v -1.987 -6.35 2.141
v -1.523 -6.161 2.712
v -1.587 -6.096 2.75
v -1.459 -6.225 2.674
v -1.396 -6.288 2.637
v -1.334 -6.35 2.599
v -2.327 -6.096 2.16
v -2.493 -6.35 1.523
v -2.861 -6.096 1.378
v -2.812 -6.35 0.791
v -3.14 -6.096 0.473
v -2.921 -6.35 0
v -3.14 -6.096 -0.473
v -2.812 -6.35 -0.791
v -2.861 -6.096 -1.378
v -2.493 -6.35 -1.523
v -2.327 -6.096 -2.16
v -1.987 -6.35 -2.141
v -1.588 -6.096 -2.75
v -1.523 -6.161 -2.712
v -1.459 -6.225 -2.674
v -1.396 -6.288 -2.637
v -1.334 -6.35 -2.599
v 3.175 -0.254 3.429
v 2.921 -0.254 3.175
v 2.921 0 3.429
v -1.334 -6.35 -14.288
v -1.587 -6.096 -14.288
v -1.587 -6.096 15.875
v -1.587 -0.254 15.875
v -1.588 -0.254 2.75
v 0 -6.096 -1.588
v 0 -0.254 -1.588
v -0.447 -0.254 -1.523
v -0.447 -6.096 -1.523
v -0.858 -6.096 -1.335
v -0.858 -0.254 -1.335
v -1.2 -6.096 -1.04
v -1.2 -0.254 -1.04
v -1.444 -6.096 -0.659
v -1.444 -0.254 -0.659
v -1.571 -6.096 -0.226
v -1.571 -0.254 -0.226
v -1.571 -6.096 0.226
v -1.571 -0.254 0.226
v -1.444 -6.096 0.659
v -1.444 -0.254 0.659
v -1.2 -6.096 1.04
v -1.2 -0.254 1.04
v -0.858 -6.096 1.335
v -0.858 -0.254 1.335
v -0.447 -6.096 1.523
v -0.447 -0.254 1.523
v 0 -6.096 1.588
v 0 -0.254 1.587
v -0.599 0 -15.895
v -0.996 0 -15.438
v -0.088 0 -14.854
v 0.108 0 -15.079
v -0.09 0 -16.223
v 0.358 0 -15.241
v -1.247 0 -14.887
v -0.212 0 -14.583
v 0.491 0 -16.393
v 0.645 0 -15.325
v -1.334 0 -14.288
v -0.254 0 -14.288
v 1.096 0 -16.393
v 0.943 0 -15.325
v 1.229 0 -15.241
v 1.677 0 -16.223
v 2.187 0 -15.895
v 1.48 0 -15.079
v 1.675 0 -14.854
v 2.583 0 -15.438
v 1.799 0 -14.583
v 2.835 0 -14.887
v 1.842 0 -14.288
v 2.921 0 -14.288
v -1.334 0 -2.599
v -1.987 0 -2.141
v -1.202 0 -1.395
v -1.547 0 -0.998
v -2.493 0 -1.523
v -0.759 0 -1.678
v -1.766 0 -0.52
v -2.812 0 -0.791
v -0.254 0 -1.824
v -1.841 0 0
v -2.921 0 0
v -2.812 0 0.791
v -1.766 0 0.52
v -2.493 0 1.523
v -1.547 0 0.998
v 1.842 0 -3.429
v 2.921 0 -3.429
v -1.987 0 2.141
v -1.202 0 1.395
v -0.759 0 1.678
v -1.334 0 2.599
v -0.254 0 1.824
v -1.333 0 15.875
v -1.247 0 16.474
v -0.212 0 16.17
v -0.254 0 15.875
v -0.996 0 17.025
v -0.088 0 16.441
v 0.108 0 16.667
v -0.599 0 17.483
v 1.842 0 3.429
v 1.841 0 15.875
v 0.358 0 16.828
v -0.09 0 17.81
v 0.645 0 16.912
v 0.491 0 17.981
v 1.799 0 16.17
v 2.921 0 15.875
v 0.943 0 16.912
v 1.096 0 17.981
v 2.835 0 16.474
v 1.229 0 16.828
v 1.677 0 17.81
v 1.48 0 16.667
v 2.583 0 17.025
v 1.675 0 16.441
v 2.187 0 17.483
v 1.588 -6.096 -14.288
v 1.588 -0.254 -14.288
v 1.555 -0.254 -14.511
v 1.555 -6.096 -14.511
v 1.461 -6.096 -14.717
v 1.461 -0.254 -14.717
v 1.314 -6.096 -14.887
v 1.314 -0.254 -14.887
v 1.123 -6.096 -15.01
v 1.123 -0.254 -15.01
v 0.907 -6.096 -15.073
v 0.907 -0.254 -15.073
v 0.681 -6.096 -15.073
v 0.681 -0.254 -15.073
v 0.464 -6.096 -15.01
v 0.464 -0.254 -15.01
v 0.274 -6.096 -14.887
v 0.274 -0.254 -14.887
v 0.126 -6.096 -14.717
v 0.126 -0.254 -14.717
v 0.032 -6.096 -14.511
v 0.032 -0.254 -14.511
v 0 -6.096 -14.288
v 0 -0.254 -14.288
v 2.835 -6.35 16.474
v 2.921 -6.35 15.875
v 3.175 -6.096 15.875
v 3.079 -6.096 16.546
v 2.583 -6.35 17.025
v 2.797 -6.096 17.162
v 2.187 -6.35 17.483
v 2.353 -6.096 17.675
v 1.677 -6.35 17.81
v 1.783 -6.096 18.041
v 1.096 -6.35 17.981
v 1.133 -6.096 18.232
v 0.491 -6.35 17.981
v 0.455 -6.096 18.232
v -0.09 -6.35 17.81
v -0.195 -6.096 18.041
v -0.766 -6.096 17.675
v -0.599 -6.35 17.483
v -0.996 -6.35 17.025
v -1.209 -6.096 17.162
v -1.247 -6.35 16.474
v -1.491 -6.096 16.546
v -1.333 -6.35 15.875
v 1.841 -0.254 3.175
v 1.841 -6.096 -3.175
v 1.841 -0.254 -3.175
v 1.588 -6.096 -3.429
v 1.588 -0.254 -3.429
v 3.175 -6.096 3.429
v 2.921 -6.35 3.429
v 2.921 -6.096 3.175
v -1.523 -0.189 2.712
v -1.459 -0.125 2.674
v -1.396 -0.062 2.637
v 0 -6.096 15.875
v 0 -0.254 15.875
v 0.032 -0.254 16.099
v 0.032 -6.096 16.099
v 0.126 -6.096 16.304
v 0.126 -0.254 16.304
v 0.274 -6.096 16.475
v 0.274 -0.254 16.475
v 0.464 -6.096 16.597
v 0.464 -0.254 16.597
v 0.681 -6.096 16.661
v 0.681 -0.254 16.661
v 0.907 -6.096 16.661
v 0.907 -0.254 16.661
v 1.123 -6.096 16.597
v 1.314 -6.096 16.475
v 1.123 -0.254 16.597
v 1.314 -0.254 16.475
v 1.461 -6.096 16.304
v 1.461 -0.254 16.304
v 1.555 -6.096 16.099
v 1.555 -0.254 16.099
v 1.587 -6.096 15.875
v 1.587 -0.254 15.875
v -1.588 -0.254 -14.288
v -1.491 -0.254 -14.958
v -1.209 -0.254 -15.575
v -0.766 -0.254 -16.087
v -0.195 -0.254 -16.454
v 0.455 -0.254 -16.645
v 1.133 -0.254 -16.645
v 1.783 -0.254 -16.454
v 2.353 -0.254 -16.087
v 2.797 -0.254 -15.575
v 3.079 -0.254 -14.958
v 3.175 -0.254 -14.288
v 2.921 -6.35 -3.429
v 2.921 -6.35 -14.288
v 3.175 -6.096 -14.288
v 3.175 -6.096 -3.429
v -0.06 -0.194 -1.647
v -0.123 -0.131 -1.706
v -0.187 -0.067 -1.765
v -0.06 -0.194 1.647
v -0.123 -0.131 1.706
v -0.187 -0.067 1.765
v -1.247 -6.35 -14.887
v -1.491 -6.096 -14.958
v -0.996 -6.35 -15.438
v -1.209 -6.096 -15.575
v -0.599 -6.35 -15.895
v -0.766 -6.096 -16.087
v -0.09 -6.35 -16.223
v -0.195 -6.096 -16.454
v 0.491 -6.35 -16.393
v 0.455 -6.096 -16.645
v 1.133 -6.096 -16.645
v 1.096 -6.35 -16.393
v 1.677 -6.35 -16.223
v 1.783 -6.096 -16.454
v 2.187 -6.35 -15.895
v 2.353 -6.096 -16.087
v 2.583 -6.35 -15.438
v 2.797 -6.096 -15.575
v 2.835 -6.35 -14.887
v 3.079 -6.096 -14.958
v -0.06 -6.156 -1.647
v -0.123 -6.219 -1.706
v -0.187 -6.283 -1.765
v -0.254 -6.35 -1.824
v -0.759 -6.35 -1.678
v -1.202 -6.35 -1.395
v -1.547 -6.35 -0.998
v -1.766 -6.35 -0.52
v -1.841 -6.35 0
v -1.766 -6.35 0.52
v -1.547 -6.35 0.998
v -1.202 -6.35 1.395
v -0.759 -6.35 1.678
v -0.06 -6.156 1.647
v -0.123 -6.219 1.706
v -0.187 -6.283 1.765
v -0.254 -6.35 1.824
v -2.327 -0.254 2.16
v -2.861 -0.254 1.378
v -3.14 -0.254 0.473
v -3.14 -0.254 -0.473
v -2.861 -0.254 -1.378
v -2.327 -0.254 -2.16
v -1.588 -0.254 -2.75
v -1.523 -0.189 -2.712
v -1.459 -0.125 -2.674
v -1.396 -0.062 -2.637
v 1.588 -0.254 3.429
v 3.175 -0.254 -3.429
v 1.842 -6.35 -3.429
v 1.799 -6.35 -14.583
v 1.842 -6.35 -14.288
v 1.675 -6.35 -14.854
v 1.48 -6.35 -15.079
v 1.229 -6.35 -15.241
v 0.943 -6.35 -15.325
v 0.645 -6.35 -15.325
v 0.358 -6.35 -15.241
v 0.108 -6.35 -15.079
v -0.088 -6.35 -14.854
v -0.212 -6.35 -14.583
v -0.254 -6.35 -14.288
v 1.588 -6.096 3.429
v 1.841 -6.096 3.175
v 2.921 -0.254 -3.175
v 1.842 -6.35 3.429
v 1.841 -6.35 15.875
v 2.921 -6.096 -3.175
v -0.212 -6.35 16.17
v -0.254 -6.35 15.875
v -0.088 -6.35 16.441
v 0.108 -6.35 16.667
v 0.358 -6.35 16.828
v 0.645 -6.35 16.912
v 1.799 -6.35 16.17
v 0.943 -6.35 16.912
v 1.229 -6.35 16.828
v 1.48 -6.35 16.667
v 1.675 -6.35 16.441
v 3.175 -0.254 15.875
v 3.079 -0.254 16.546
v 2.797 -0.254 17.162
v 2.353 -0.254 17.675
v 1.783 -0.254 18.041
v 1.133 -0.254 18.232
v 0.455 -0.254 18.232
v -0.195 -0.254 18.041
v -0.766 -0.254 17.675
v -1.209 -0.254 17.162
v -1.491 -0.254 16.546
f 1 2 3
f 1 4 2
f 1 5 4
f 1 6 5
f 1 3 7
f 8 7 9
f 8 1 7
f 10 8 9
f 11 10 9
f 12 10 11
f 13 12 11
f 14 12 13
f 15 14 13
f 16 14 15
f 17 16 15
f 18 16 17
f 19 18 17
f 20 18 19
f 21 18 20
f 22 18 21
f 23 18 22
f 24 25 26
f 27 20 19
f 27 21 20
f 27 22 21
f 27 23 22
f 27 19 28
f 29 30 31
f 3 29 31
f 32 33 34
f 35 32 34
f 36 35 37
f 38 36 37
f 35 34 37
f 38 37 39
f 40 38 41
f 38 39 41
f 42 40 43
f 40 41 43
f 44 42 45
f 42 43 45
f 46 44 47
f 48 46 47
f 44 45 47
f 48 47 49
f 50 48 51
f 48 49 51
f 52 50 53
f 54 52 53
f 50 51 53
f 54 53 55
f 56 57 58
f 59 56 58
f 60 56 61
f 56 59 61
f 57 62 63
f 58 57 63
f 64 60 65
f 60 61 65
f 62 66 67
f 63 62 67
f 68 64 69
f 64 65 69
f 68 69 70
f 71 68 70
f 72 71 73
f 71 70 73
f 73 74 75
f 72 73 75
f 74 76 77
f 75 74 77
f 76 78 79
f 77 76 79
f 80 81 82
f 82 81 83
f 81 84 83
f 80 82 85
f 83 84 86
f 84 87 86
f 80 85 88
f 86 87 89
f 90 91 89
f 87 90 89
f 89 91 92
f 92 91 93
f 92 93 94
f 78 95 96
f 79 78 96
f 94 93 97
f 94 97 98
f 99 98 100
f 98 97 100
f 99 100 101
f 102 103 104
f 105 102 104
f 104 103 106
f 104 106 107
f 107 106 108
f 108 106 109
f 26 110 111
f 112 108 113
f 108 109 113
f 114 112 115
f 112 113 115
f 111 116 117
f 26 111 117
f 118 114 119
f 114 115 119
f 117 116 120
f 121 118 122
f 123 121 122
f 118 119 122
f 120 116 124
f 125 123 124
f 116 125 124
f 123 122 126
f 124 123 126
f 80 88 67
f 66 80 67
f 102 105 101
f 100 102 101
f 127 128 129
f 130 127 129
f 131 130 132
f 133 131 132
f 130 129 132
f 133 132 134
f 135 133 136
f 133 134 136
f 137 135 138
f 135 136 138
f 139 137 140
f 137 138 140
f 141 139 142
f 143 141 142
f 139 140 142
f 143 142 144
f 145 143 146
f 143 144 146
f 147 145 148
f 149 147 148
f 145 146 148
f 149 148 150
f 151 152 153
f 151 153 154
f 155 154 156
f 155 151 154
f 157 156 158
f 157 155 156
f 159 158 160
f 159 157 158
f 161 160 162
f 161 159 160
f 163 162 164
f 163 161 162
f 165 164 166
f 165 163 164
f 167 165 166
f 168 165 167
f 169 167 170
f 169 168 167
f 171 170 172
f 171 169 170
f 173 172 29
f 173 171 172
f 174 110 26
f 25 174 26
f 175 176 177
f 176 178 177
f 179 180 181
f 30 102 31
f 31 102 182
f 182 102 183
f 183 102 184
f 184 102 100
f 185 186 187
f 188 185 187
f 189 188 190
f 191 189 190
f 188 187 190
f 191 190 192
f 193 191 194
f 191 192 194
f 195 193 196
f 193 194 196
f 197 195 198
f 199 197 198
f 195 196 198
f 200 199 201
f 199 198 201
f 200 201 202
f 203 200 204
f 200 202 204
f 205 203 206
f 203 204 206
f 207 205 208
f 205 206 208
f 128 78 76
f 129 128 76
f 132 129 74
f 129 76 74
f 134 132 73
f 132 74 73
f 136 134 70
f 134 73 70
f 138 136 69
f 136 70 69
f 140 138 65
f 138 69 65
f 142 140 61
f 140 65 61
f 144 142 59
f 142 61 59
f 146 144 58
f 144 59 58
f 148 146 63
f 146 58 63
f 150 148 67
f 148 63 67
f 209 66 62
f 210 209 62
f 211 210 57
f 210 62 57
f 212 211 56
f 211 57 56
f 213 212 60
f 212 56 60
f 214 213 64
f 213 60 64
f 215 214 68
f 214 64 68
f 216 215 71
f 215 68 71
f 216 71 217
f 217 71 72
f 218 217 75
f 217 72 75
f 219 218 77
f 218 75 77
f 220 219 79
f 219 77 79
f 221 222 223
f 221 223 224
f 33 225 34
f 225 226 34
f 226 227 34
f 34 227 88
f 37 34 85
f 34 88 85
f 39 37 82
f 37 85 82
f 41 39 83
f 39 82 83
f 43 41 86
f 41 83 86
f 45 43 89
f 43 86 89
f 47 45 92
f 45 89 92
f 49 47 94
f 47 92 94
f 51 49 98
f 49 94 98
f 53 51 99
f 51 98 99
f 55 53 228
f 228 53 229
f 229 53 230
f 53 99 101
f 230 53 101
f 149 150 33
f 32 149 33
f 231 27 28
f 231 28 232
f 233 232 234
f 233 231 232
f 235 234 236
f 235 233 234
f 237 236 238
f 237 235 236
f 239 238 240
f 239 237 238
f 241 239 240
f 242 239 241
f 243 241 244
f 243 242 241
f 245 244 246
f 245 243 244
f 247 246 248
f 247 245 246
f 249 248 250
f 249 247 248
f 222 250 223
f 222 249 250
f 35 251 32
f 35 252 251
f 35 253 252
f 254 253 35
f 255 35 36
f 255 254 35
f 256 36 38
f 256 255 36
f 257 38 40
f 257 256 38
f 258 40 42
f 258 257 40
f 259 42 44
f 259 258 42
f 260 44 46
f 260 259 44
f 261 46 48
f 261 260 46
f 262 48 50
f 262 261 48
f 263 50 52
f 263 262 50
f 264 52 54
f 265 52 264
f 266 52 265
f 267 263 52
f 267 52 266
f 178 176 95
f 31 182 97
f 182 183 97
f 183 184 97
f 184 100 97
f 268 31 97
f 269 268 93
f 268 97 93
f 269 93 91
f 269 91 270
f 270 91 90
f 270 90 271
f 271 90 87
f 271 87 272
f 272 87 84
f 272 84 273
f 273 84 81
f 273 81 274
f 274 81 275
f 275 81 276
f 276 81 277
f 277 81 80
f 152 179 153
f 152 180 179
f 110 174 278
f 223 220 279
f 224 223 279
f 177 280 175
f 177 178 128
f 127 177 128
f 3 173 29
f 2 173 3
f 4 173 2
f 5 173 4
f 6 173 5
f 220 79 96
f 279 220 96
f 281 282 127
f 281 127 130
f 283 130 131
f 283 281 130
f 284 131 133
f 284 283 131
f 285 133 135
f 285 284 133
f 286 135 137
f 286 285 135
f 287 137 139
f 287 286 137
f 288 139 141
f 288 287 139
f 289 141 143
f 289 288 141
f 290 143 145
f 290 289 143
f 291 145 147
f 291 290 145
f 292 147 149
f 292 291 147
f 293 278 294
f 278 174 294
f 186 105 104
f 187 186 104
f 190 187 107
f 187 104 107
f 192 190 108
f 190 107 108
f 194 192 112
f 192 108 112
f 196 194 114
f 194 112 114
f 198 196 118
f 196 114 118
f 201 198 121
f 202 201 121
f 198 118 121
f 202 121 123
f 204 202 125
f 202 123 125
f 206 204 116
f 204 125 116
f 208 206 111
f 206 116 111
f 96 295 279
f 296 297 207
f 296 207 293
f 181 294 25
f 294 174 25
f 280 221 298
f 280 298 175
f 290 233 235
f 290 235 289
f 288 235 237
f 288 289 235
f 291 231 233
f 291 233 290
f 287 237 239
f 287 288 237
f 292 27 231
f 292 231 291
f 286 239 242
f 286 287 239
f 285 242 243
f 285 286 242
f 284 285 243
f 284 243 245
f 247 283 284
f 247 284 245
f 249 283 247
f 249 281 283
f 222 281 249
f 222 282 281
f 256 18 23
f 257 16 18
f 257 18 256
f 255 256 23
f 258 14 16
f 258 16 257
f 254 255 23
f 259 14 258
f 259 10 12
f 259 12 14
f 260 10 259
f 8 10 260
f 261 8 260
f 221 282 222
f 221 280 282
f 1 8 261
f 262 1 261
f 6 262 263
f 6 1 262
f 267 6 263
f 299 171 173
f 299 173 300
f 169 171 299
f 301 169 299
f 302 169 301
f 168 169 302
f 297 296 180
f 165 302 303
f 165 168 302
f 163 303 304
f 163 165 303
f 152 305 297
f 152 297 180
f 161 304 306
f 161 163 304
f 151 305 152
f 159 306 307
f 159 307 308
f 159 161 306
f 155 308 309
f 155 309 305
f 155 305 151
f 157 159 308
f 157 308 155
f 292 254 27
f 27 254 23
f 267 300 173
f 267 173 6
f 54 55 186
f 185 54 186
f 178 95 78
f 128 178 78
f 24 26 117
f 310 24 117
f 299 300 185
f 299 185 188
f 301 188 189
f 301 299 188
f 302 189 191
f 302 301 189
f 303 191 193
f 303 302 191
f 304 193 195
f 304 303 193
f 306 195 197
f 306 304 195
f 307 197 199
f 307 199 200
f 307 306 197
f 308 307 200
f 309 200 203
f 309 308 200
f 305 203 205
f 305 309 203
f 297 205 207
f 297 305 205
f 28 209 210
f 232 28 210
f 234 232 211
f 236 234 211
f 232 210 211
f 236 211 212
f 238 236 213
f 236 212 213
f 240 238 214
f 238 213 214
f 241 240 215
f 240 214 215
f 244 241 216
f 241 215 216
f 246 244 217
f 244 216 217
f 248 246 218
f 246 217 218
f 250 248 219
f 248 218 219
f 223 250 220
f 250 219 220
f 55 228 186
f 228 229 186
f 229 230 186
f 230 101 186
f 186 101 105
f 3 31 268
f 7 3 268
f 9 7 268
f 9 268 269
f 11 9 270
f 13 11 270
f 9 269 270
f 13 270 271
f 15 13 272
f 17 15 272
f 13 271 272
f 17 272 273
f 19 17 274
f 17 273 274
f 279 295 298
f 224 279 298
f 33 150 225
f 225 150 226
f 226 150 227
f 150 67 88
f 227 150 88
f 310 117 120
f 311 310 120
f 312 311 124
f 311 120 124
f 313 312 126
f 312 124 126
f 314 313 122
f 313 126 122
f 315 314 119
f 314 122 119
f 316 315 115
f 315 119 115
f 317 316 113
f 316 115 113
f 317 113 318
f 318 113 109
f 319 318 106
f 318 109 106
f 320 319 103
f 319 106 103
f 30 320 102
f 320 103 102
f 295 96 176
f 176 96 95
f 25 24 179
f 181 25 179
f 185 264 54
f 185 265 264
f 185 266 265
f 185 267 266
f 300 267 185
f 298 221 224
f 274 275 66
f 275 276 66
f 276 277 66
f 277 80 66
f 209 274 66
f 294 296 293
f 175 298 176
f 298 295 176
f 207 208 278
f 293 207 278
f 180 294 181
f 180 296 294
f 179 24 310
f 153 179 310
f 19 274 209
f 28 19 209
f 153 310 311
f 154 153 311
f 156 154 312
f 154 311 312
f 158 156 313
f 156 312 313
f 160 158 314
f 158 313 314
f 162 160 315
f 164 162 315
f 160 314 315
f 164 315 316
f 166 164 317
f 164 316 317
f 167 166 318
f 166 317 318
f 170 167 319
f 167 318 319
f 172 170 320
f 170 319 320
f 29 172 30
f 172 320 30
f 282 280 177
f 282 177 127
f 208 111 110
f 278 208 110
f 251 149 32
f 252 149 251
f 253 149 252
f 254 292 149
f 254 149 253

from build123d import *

# Parameters (mm, degrees)
F1_DEPTH = 6.35
F2_SIZE  = 0.254


# Not quite as in the source:
# - a feature names something its author has since deleted; it is built from what else it names


with BuildPart() as f1:
    # F0 (on Front) → F1 (new body)
    with BuildSketch(Plane.XZ):
        with BuildLine():
            Line((0, 1.5875), (0, 15.875))
            ThreePointArc((0, 15.875), (0.79375, 16.66875), (1.5875, 15.875))
            Line((1.5875, 15.875), (1.5875, 3.175))
            Line((1.5875, 3.175), (3.175, 3.175))
            Line((3.175, 3.175), (3.175, 15.875))
            ThreePointArc((3.175, 15.875), (0.79375, 18.25625), (-1.5875, 15.875))
            Line((-1.5875, 15.875), (-1.5875, 2.749630657))
            ThreePointArc((-1.5875, 2.749630657), (-3.175, 0), (-1.5875, -2.749630657))
            Line((-1.5875, -2.749630657), (-1.5875, -14.2875))
            ThreePointArc((-1.5875, -14.2875), (0.79375, -16.66875), (3.175, -14.2875))
            Line((3.175, -14.2875), (3.175, -3.175))
            Line((3.175, -3.175), (1.5875, -3.175))
            Line((1.5875, -3.175), (1.5875, -14.2875))
            ThreePointArc((1.5875, -14.2875), (0.79375, -15.08125), (0, -14.2875))
            Line((0, -14.2875), (0, -1.5875))
            ThreePointArc((0, -1.5875), (-1.5875, 0), (0, 1.5875))
        make_face()
    extrude(amount=F1_DEPTH)

    # F2
    f2_edges = [f1.edges().sort_by_distance(p)[0] for p in [
        (-1.5875, -6.35, 9.312315),
        (0.79375, -6.35, 18.25625),
        (3.175, -6.35, 9.525),
        (-3.175, -6.35, 0),
        (-1.5875, -6.35, -8.518565),
        (0.79375, -6.35, -16.66875),
        (3.175, -6.35, -8.73125),
        (2.38125, -6.35, 3.175),
        (2.38125, -6.35, -3.175),
        (0, -6.35, -7.9375),
        (-1.5875, -6.35, 0),
        (0, -6.35, 8.73125),
        (1.5875, -3.175, 3.175),
        (1.5875, -3.175, -3.175),
        (2.38125, 0, -3.175),
        (3.175, -3.175, -3.175),
        (2.38125, 0, 3.175),
        (3.175, -3.175, 3.175),
        (3.175, 0, 9.525),
        (3.175, 0, -8.73125),
        (-3.175, 0, 0),
        (1.5875, 0, -8.73125),
        (1.5875, 0, 9.525),
        (-1.5875, 0, 0),
    ]]
    chamfer(f2_edges, length=F2_SIZE)


solid = f1.part
